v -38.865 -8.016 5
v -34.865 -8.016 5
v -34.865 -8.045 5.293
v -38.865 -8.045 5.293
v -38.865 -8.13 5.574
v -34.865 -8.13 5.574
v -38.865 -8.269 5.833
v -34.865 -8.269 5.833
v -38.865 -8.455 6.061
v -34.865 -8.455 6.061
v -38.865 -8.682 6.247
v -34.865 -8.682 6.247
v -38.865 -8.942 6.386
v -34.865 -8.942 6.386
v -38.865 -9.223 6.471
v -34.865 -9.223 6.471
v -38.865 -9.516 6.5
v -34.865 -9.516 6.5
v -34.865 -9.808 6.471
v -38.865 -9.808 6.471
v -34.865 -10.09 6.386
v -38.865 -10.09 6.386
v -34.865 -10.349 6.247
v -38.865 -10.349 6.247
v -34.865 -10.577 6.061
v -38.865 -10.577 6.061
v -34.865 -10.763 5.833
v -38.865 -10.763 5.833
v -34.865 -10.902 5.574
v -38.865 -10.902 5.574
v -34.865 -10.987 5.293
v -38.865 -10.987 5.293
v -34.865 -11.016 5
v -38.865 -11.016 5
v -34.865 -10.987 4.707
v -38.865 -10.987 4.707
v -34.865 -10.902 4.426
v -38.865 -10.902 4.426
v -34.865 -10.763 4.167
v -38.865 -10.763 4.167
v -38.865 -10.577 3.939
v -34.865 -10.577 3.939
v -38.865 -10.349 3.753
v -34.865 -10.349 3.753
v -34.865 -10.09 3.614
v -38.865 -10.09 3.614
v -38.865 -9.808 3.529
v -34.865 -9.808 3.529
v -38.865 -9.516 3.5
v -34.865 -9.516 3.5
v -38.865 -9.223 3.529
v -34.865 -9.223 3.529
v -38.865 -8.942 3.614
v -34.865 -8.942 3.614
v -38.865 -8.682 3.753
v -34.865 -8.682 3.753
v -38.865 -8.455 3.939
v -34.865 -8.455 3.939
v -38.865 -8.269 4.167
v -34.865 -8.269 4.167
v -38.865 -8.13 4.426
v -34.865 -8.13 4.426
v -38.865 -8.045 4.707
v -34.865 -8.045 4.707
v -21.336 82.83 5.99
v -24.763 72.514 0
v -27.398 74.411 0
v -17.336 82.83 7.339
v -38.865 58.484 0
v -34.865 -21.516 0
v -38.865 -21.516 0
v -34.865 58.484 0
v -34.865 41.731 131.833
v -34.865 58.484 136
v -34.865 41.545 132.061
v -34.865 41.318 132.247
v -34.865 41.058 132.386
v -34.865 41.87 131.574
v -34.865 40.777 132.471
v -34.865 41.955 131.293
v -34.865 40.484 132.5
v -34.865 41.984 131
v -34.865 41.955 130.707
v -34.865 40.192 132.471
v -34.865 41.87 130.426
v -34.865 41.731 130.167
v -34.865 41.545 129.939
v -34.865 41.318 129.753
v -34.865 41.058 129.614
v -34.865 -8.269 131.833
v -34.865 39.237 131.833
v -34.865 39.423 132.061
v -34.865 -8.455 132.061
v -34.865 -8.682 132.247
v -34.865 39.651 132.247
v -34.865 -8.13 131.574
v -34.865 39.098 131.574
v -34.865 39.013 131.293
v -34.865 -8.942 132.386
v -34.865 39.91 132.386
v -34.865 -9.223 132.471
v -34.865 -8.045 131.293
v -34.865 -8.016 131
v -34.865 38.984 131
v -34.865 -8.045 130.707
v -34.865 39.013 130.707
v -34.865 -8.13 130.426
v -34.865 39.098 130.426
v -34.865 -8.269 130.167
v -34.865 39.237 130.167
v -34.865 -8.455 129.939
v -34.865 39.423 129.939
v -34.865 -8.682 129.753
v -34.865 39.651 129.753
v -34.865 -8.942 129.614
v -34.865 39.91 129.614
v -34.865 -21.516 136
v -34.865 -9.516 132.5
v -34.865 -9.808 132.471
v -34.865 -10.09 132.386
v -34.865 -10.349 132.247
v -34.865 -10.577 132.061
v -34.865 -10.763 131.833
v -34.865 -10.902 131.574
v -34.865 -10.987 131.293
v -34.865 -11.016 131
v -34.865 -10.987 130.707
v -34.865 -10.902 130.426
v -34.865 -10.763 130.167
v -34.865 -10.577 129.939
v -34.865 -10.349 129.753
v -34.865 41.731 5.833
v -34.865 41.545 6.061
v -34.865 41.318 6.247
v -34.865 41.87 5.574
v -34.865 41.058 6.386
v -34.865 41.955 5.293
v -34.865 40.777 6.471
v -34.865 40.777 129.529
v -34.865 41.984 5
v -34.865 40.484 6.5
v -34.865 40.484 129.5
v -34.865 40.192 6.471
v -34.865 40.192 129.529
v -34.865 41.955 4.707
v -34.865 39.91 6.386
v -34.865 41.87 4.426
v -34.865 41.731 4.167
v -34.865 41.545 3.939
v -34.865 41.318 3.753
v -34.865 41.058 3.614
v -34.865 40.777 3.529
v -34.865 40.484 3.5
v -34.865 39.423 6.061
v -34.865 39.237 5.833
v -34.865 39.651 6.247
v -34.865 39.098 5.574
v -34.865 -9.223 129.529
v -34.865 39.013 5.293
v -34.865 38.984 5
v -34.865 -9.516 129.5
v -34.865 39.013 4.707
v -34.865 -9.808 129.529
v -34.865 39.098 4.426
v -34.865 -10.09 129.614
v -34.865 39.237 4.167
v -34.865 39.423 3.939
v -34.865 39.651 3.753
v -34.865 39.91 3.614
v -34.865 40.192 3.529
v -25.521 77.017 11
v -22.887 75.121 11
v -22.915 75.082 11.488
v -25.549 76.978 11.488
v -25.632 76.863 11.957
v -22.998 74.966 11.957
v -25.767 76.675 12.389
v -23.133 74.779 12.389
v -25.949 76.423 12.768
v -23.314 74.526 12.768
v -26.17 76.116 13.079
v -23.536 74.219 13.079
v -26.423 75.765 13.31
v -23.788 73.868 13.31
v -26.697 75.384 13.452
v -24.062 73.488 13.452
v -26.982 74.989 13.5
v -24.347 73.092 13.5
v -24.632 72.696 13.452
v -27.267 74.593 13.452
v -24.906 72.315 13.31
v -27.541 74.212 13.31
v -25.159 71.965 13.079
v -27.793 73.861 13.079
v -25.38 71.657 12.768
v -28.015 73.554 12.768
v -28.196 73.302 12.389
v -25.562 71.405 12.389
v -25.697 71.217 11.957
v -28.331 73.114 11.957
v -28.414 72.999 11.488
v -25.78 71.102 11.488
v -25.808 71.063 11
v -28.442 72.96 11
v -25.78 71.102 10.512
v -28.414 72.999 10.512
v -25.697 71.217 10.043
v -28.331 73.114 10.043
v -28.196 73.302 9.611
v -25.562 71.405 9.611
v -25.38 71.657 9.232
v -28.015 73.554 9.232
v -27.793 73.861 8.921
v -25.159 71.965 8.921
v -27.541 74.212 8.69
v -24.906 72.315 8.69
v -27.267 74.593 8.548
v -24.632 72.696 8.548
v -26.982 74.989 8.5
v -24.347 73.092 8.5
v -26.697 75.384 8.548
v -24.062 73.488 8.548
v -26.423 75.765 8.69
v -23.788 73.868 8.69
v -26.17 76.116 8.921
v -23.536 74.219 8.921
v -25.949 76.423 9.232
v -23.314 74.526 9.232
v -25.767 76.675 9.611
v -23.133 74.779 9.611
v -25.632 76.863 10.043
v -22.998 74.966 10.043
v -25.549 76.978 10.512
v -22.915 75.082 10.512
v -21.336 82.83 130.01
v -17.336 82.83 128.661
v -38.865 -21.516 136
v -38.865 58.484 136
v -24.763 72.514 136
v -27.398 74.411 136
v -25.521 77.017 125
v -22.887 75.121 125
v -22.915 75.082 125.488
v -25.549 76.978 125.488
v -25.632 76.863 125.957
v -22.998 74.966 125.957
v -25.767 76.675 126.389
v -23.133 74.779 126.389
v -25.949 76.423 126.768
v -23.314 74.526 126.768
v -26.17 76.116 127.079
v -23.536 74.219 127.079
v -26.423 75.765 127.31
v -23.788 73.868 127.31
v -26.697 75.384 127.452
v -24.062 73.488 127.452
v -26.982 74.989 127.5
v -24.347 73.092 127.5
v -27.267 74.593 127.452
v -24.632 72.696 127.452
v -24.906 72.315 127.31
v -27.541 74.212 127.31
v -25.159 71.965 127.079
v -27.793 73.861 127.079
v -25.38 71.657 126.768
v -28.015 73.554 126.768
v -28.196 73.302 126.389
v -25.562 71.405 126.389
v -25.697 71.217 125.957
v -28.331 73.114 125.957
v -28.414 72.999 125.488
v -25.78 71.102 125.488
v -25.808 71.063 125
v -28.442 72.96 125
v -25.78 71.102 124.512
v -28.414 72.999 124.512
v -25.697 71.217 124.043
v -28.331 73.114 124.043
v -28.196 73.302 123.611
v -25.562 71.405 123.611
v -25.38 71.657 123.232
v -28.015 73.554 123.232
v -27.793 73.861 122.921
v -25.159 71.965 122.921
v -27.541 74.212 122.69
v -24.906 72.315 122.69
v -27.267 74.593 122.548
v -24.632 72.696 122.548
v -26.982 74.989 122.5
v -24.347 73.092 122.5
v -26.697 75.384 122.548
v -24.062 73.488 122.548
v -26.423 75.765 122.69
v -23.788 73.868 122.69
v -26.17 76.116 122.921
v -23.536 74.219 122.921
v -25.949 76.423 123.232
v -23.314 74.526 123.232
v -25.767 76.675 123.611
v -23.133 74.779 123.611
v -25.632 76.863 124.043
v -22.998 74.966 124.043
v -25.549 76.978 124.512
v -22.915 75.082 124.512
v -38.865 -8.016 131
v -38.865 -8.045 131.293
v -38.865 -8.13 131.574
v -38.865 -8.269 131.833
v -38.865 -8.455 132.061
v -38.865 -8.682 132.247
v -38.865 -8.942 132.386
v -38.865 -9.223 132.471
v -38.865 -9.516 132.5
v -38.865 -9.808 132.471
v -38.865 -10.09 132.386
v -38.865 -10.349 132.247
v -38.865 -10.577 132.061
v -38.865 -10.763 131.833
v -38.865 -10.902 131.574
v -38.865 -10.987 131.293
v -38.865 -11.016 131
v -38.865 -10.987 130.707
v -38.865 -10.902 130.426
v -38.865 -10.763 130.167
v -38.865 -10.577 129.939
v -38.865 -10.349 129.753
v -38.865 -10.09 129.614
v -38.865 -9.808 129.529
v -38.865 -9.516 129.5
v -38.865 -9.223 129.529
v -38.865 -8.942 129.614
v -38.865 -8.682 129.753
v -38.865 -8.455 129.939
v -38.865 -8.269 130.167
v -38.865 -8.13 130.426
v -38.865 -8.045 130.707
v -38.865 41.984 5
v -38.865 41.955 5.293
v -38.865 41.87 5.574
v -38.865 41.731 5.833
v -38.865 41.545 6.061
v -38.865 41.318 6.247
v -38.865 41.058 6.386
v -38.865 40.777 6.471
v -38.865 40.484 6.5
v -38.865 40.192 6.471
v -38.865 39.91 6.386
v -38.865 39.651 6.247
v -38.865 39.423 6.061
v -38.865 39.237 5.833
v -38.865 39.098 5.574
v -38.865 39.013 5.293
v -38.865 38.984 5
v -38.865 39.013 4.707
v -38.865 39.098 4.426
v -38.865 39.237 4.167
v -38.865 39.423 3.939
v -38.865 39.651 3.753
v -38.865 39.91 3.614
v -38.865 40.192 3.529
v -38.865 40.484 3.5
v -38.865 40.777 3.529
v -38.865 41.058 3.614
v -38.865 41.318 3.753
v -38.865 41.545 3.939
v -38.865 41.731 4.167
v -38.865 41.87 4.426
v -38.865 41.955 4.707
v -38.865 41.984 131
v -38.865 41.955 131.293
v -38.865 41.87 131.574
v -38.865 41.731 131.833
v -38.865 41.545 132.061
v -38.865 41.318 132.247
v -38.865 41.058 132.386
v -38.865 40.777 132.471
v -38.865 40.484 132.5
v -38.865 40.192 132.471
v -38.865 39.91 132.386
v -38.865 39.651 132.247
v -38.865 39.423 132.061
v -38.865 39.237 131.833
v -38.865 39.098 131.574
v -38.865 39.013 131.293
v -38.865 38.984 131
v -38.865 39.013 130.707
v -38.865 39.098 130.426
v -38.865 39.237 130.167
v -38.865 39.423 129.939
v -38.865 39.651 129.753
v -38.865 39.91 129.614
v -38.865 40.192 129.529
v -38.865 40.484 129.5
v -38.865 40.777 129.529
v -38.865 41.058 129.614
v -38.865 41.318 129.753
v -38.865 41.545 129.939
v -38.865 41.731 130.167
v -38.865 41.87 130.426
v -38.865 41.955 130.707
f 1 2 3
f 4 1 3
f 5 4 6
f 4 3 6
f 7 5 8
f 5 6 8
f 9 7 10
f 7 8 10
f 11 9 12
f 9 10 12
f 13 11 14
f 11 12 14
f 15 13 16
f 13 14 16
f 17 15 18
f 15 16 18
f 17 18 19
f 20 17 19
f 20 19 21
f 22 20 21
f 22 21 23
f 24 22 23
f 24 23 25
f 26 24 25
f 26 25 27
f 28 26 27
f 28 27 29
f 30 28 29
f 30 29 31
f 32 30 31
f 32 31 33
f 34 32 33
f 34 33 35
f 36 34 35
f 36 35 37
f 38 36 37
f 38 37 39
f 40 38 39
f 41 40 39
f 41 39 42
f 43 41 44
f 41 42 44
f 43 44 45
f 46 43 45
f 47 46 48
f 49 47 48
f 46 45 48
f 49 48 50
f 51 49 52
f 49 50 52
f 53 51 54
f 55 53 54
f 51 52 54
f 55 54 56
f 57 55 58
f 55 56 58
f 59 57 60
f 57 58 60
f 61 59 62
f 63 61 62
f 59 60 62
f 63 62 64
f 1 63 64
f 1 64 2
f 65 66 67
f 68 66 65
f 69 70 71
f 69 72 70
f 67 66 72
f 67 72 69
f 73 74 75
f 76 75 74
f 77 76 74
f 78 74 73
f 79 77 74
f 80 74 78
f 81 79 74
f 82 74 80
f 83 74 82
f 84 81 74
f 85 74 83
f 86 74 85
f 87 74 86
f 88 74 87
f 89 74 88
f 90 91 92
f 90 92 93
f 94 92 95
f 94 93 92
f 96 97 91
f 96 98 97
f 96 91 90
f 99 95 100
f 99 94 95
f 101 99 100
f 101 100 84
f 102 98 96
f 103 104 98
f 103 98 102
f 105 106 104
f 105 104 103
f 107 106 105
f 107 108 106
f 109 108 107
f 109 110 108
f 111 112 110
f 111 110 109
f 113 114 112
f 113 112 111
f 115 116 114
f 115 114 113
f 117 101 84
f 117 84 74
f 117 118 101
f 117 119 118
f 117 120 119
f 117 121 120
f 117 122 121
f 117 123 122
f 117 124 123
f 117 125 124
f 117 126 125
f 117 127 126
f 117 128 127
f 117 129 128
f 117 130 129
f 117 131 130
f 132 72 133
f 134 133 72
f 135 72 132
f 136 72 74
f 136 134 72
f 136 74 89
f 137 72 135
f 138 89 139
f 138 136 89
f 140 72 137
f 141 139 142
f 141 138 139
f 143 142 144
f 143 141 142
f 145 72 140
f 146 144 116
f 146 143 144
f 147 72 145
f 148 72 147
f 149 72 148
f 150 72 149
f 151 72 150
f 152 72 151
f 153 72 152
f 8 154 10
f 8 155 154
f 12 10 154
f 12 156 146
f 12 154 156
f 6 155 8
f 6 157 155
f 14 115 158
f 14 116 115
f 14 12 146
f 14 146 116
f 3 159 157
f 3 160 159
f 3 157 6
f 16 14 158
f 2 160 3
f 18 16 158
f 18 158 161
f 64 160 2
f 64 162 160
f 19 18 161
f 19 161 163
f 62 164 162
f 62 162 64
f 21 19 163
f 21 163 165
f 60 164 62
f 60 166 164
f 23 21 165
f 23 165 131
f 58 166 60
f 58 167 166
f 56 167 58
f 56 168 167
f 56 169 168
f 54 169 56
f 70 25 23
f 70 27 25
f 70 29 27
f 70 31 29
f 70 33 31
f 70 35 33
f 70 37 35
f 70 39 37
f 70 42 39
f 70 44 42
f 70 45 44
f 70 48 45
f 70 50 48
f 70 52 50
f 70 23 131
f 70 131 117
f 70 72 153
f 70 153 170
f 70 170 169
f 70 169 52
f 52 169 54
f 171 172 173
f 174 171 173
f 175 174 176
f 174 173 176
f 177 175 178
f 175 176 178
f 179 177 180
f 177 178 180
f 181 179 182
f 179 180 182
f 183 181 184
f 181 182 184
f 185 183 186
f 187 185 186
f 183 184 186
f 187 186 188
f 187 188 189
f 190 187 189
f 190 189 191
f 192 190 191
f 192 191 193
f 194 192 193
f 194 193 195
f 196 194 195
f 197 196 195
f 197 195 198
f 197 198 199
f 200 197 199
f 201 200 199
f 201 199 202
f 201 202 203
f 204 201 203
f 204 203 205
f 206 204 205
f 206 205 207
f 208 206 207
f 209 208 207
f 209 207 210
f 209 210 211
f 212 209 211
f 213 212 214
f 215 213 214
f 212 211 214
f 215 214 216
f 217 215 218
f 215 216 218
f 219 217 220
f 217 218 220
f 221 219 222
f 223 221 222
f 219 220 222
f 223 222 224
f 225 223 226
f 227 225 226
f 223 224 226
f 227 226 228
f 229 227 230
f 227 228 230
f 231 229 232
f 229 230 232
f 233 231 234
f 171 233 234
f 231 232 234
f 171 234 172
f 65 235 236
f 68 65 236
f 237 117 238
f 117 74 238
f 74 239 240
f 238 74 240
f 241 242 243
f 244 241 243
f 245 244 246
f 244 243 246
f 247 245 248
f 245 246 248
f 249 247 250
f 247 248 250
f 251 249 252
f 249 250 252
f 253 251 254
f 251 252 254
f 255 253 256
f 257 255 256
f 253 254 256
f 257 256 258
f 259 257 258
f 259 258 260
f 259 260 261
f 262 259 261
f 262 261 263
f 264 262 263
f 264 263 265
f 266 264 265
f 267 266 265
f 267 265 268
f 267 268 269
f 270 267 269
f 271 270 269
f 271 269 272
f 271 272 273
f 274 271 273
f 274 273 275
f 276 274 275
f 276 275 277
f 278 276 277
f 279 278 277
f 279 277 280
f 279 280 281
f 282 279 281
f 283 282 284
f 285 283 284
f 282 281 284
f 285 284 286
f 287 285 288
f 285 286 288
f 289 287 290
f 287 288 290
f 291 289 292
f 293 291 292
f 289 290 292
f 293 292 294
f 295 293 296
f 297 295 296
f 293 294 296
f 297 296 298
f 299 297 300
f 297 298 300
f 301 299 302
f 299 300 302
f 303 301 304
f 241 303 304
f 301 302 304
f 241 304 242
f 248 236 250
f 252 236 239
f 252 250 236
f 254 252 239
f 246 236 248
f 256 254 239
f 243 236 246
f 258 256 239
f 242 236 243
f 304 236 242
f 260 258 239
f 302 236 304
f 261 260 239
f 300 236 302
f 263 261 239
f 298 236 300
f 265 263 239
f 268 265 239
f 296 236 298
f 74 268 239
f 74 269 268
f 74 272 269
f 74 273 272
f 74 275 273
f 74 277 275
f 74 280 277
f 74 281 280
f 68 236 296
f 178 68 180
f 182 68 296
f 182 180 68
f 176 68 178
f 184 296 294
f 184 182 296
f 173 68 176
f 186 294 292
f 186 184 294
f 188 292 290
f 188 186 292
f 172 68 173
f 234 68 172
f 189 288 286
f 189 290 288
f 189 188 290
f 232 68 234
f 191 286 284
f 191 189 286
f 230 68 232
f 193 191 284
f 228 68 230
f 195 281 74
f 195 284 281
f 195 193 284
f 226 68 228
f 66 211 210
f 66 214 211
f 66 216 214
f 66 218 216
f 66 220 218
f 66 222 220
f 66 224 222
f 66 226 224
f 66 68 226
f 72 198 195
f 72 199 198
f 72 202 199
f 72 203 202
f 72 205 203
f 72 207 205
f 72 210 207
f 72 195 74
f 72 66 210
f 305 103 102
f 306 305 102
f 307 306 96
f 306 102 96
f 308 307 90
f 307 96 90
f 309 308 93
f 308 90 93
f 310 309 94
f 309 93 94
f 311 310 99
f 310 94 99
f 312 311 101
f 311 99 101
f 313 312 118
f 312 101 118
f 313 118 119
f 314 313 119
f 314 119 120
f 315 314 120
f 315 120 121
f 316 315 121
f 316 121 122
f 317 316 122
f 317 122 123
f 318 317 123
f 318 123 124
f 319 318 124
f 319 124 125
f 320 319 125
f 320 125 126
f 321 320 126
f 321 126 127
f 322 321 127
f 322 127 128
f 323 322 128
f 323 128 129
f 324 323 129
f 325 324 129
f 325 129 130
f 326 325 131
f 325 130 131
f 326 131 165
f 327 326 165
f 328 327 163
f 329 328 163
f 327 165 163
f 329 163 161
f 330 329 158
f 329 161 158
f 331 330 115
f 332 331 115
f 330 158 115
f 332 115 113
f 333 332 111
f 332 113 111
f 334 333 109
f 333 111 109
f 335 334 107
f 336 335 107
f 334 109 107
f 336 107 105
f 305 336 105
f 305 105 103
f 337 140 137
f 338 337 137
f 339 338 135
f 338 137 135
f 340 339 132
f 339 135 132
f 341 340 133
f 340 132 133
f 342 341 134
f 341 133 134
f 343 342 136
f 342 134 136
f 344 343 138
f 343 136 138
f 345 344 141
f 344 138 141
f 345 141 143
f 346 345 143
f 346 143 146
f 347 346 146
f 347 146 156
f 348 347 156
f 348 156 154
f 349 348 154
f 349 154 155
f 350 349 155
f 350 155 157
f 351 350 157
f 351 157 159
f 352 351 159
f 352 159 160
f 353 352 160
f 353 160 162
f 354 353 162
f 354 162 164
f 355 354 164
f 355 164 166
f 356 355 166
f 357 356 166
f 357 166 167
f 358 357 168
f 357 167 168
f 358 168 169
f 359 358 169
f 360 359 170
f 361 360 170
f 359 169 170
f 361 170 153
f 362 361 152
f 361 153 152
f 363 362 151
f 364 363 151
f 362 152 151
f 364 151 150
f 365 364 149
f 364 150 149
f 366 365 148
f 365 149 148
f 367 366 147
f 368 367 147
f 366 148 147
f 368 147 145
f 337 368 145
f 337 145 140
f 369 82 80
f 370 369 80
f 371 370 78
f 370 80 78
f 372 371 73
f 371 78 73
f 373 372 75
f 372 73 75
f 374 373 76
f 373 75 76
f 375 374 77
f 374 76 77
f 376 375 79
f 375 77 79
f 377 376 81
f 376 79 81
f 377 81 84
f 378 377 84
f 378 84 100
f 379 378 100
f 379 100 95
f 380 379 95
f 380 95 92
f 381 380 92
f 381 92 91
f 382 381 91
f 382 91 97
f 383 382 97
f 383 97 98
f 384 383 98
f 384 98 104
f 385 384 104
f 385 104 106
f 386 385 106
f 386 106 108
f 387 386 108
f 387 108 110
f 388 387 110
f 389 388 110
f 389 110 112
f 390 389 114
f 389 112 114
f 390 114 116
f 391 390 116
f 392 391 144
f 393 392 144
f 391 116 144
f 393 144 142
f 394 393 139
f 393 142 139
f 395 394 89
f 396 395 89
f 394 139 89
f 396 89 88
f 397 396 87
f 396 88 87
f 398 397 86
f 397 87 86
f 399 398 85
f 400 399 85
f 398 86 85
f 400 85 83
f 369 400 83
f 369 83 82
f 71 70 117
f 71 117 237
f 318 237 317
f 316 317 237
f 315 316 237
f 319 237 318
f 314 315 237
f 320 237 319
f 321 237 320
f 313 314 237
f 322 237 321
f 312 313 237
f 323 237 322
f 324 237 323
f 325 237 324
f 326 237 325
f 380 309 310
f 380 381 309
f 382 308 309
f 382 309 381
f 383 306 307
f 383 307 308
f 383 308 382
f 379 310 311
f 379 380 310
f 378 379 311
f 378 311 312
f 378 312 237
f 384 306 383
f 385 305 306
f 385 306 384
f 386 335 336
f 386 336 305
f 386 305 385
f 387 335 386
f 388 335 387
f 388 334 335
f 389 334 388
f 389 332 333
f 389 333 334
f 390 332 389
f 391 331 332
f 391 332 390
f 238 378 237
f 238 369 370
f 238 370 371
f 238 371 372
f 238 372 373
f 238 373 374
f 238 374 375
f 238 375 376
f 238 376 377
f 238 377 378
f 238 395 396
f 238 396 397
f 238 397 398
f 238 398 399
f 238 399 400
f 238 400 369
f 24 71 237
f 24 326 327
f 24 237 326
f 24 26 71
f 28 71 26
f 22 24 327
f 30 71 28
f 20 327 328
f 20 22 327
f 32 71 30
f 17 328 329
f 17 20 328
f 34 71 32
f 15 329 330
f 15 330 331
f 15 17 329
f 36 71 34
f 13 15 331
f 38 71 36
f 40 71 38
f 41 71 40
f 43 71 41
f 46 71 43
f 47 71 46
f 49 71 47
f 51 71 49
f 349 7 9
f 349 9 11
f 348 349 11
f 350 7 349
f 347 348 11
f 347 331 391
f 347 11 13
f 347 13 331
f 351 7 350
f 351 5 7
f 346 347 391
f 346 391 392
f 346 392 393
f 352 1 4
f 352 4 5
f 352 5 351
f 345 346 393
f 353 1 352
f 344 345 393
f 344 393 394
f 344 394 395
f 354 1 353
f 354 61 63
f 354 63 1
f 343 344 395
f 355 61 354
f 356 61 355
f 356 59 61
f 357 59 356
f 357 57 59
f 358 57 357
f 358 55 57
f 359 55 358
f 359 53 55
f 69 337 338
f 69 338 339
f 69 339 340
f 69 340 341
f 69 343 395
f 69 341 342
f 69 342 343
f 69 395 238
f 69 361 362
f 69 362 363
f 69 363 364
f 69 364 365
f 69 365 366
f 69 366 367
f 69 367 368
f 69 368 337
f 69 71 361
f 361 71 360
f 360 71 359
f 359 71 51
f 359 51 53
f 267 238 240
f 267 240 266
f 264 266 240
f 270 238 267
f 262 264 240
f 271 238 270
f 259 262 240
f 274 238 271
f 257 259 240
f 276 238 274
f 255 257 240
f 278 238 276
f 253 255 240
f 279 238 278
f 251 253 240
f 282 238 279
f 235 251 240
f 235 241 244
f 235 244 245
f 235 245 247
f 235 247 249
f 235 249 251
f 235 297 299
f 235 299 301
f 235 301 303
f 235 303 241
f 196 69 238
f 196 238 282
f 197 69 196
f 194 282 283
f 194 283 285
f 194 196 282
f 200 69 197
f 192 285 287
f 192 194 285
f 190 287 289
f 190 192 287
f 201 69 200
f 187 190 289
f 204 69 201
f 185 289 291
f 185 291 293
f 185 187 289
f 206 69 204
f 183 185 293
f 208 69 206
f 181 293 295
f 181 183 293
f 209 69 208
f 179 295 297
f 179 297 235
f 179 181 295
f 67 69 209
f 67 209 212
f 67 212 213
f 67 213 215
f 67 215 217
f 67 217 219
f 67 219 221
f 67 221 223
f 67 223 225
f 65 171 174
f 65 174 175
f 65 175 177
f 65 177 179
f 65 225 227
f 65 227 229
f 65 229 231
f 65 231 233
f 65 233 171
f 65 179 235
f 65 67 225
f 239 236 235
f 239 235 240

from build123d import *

# Parameters (mm, degrees)
EXTRUDE_1_DEPTH     = 136
SKETCH_3_R          = 1.5
CUT_EXTRUDE_1_DEPTH = 136
SKETCH_4_R          = 2.5
CUT_EXTRUDE_2_DEPTH = 136
CUT_EXTRUDE_3_DEPTH = 136


with BuildPart() as part:
    # 草图2 → 凸台-拉伸1 (new body)
    with BuildSketch(Plane.XY):
        Polygon((-38.864866985, -21.515849201), (-38.864866985, 58.484150799), (-21.335725209, 82.830181043), (-17.335725209, 82.830181043), (-34.864866985, 58.484150799), (-34.864866985, -21.515849201), align=None)
    extrude(amount=EXTRUDE_1_DEPTH)

    # 草图3 → 切除-拉伸1 (cut)
    with BuildSketch(Plane(origin=(-34.864866985, 0, 0), x_dir=(0, 0, -1), z_dir=(1, 0, 0))):
        with Locations(Location((-131, 40.484150799, 0), (0, 0, 90))):
            Circle(SKETCH_3_R)
        with Locations(Location((-131, -9.515849201, 0), (0, 0, 90))):
            Circle(SKETCH_3_R)
        with Locations(Location((-5, 40.484150799, 0), (0, 0, 90))):
            Circle(SKETCH_3_R)
        with Locations(Location((-5, -9.515849201, 0), (0, 0, 90))):
            Circle(SKETCH_3_R)
    extrude(amount=-CUT_EXTRUDE_1_DEPTH, mode=Mode.SUBTRACT)

    # 草图4 → 切除-拉伸2 (cut)
    with BuildSketch(Plane(origin=(-50.693793177, 36.499531087, 0), x_dir=(0, 0, -1), z_dir=(0.8115343414514944, -0.5843047258450759, 0))):
        with Locations(Location((-125, 45.090190259, 0), (0, 0, 90))):
            Circle(SKETCH_4_R)
        with Locations(Location((-11, 45.090190259, 0), (0, 0, 90))):
            Circle(SKETCH_4_R)
    extrude(amount=-CUT_EXTRUDE_2_DEPTH, mode=Mode.SUBTRACT)

    # 草图5 → 切除-拉伸3 (cut)
    with BuildSketch(Plane(origin=(-50.693793177, 36.499531087, 0), x_dir=(0, 0, -1), z_dir=(0.8115343414514944, -0.5843047258450759, 0))):
        Polygon((-136, 44.378333204), (-136, 60.422396469), (-128.660805907, 57.090190259), align=None)
        Polygon((-7.339194093, 57.090190259), (0, 57.090190259), (0, 44.378333204), align=None)
    extrude(amount=-CUT_EXTRUDE_3_DEPTH, mode=Mode.SUBTRACT)


solid = part.part
